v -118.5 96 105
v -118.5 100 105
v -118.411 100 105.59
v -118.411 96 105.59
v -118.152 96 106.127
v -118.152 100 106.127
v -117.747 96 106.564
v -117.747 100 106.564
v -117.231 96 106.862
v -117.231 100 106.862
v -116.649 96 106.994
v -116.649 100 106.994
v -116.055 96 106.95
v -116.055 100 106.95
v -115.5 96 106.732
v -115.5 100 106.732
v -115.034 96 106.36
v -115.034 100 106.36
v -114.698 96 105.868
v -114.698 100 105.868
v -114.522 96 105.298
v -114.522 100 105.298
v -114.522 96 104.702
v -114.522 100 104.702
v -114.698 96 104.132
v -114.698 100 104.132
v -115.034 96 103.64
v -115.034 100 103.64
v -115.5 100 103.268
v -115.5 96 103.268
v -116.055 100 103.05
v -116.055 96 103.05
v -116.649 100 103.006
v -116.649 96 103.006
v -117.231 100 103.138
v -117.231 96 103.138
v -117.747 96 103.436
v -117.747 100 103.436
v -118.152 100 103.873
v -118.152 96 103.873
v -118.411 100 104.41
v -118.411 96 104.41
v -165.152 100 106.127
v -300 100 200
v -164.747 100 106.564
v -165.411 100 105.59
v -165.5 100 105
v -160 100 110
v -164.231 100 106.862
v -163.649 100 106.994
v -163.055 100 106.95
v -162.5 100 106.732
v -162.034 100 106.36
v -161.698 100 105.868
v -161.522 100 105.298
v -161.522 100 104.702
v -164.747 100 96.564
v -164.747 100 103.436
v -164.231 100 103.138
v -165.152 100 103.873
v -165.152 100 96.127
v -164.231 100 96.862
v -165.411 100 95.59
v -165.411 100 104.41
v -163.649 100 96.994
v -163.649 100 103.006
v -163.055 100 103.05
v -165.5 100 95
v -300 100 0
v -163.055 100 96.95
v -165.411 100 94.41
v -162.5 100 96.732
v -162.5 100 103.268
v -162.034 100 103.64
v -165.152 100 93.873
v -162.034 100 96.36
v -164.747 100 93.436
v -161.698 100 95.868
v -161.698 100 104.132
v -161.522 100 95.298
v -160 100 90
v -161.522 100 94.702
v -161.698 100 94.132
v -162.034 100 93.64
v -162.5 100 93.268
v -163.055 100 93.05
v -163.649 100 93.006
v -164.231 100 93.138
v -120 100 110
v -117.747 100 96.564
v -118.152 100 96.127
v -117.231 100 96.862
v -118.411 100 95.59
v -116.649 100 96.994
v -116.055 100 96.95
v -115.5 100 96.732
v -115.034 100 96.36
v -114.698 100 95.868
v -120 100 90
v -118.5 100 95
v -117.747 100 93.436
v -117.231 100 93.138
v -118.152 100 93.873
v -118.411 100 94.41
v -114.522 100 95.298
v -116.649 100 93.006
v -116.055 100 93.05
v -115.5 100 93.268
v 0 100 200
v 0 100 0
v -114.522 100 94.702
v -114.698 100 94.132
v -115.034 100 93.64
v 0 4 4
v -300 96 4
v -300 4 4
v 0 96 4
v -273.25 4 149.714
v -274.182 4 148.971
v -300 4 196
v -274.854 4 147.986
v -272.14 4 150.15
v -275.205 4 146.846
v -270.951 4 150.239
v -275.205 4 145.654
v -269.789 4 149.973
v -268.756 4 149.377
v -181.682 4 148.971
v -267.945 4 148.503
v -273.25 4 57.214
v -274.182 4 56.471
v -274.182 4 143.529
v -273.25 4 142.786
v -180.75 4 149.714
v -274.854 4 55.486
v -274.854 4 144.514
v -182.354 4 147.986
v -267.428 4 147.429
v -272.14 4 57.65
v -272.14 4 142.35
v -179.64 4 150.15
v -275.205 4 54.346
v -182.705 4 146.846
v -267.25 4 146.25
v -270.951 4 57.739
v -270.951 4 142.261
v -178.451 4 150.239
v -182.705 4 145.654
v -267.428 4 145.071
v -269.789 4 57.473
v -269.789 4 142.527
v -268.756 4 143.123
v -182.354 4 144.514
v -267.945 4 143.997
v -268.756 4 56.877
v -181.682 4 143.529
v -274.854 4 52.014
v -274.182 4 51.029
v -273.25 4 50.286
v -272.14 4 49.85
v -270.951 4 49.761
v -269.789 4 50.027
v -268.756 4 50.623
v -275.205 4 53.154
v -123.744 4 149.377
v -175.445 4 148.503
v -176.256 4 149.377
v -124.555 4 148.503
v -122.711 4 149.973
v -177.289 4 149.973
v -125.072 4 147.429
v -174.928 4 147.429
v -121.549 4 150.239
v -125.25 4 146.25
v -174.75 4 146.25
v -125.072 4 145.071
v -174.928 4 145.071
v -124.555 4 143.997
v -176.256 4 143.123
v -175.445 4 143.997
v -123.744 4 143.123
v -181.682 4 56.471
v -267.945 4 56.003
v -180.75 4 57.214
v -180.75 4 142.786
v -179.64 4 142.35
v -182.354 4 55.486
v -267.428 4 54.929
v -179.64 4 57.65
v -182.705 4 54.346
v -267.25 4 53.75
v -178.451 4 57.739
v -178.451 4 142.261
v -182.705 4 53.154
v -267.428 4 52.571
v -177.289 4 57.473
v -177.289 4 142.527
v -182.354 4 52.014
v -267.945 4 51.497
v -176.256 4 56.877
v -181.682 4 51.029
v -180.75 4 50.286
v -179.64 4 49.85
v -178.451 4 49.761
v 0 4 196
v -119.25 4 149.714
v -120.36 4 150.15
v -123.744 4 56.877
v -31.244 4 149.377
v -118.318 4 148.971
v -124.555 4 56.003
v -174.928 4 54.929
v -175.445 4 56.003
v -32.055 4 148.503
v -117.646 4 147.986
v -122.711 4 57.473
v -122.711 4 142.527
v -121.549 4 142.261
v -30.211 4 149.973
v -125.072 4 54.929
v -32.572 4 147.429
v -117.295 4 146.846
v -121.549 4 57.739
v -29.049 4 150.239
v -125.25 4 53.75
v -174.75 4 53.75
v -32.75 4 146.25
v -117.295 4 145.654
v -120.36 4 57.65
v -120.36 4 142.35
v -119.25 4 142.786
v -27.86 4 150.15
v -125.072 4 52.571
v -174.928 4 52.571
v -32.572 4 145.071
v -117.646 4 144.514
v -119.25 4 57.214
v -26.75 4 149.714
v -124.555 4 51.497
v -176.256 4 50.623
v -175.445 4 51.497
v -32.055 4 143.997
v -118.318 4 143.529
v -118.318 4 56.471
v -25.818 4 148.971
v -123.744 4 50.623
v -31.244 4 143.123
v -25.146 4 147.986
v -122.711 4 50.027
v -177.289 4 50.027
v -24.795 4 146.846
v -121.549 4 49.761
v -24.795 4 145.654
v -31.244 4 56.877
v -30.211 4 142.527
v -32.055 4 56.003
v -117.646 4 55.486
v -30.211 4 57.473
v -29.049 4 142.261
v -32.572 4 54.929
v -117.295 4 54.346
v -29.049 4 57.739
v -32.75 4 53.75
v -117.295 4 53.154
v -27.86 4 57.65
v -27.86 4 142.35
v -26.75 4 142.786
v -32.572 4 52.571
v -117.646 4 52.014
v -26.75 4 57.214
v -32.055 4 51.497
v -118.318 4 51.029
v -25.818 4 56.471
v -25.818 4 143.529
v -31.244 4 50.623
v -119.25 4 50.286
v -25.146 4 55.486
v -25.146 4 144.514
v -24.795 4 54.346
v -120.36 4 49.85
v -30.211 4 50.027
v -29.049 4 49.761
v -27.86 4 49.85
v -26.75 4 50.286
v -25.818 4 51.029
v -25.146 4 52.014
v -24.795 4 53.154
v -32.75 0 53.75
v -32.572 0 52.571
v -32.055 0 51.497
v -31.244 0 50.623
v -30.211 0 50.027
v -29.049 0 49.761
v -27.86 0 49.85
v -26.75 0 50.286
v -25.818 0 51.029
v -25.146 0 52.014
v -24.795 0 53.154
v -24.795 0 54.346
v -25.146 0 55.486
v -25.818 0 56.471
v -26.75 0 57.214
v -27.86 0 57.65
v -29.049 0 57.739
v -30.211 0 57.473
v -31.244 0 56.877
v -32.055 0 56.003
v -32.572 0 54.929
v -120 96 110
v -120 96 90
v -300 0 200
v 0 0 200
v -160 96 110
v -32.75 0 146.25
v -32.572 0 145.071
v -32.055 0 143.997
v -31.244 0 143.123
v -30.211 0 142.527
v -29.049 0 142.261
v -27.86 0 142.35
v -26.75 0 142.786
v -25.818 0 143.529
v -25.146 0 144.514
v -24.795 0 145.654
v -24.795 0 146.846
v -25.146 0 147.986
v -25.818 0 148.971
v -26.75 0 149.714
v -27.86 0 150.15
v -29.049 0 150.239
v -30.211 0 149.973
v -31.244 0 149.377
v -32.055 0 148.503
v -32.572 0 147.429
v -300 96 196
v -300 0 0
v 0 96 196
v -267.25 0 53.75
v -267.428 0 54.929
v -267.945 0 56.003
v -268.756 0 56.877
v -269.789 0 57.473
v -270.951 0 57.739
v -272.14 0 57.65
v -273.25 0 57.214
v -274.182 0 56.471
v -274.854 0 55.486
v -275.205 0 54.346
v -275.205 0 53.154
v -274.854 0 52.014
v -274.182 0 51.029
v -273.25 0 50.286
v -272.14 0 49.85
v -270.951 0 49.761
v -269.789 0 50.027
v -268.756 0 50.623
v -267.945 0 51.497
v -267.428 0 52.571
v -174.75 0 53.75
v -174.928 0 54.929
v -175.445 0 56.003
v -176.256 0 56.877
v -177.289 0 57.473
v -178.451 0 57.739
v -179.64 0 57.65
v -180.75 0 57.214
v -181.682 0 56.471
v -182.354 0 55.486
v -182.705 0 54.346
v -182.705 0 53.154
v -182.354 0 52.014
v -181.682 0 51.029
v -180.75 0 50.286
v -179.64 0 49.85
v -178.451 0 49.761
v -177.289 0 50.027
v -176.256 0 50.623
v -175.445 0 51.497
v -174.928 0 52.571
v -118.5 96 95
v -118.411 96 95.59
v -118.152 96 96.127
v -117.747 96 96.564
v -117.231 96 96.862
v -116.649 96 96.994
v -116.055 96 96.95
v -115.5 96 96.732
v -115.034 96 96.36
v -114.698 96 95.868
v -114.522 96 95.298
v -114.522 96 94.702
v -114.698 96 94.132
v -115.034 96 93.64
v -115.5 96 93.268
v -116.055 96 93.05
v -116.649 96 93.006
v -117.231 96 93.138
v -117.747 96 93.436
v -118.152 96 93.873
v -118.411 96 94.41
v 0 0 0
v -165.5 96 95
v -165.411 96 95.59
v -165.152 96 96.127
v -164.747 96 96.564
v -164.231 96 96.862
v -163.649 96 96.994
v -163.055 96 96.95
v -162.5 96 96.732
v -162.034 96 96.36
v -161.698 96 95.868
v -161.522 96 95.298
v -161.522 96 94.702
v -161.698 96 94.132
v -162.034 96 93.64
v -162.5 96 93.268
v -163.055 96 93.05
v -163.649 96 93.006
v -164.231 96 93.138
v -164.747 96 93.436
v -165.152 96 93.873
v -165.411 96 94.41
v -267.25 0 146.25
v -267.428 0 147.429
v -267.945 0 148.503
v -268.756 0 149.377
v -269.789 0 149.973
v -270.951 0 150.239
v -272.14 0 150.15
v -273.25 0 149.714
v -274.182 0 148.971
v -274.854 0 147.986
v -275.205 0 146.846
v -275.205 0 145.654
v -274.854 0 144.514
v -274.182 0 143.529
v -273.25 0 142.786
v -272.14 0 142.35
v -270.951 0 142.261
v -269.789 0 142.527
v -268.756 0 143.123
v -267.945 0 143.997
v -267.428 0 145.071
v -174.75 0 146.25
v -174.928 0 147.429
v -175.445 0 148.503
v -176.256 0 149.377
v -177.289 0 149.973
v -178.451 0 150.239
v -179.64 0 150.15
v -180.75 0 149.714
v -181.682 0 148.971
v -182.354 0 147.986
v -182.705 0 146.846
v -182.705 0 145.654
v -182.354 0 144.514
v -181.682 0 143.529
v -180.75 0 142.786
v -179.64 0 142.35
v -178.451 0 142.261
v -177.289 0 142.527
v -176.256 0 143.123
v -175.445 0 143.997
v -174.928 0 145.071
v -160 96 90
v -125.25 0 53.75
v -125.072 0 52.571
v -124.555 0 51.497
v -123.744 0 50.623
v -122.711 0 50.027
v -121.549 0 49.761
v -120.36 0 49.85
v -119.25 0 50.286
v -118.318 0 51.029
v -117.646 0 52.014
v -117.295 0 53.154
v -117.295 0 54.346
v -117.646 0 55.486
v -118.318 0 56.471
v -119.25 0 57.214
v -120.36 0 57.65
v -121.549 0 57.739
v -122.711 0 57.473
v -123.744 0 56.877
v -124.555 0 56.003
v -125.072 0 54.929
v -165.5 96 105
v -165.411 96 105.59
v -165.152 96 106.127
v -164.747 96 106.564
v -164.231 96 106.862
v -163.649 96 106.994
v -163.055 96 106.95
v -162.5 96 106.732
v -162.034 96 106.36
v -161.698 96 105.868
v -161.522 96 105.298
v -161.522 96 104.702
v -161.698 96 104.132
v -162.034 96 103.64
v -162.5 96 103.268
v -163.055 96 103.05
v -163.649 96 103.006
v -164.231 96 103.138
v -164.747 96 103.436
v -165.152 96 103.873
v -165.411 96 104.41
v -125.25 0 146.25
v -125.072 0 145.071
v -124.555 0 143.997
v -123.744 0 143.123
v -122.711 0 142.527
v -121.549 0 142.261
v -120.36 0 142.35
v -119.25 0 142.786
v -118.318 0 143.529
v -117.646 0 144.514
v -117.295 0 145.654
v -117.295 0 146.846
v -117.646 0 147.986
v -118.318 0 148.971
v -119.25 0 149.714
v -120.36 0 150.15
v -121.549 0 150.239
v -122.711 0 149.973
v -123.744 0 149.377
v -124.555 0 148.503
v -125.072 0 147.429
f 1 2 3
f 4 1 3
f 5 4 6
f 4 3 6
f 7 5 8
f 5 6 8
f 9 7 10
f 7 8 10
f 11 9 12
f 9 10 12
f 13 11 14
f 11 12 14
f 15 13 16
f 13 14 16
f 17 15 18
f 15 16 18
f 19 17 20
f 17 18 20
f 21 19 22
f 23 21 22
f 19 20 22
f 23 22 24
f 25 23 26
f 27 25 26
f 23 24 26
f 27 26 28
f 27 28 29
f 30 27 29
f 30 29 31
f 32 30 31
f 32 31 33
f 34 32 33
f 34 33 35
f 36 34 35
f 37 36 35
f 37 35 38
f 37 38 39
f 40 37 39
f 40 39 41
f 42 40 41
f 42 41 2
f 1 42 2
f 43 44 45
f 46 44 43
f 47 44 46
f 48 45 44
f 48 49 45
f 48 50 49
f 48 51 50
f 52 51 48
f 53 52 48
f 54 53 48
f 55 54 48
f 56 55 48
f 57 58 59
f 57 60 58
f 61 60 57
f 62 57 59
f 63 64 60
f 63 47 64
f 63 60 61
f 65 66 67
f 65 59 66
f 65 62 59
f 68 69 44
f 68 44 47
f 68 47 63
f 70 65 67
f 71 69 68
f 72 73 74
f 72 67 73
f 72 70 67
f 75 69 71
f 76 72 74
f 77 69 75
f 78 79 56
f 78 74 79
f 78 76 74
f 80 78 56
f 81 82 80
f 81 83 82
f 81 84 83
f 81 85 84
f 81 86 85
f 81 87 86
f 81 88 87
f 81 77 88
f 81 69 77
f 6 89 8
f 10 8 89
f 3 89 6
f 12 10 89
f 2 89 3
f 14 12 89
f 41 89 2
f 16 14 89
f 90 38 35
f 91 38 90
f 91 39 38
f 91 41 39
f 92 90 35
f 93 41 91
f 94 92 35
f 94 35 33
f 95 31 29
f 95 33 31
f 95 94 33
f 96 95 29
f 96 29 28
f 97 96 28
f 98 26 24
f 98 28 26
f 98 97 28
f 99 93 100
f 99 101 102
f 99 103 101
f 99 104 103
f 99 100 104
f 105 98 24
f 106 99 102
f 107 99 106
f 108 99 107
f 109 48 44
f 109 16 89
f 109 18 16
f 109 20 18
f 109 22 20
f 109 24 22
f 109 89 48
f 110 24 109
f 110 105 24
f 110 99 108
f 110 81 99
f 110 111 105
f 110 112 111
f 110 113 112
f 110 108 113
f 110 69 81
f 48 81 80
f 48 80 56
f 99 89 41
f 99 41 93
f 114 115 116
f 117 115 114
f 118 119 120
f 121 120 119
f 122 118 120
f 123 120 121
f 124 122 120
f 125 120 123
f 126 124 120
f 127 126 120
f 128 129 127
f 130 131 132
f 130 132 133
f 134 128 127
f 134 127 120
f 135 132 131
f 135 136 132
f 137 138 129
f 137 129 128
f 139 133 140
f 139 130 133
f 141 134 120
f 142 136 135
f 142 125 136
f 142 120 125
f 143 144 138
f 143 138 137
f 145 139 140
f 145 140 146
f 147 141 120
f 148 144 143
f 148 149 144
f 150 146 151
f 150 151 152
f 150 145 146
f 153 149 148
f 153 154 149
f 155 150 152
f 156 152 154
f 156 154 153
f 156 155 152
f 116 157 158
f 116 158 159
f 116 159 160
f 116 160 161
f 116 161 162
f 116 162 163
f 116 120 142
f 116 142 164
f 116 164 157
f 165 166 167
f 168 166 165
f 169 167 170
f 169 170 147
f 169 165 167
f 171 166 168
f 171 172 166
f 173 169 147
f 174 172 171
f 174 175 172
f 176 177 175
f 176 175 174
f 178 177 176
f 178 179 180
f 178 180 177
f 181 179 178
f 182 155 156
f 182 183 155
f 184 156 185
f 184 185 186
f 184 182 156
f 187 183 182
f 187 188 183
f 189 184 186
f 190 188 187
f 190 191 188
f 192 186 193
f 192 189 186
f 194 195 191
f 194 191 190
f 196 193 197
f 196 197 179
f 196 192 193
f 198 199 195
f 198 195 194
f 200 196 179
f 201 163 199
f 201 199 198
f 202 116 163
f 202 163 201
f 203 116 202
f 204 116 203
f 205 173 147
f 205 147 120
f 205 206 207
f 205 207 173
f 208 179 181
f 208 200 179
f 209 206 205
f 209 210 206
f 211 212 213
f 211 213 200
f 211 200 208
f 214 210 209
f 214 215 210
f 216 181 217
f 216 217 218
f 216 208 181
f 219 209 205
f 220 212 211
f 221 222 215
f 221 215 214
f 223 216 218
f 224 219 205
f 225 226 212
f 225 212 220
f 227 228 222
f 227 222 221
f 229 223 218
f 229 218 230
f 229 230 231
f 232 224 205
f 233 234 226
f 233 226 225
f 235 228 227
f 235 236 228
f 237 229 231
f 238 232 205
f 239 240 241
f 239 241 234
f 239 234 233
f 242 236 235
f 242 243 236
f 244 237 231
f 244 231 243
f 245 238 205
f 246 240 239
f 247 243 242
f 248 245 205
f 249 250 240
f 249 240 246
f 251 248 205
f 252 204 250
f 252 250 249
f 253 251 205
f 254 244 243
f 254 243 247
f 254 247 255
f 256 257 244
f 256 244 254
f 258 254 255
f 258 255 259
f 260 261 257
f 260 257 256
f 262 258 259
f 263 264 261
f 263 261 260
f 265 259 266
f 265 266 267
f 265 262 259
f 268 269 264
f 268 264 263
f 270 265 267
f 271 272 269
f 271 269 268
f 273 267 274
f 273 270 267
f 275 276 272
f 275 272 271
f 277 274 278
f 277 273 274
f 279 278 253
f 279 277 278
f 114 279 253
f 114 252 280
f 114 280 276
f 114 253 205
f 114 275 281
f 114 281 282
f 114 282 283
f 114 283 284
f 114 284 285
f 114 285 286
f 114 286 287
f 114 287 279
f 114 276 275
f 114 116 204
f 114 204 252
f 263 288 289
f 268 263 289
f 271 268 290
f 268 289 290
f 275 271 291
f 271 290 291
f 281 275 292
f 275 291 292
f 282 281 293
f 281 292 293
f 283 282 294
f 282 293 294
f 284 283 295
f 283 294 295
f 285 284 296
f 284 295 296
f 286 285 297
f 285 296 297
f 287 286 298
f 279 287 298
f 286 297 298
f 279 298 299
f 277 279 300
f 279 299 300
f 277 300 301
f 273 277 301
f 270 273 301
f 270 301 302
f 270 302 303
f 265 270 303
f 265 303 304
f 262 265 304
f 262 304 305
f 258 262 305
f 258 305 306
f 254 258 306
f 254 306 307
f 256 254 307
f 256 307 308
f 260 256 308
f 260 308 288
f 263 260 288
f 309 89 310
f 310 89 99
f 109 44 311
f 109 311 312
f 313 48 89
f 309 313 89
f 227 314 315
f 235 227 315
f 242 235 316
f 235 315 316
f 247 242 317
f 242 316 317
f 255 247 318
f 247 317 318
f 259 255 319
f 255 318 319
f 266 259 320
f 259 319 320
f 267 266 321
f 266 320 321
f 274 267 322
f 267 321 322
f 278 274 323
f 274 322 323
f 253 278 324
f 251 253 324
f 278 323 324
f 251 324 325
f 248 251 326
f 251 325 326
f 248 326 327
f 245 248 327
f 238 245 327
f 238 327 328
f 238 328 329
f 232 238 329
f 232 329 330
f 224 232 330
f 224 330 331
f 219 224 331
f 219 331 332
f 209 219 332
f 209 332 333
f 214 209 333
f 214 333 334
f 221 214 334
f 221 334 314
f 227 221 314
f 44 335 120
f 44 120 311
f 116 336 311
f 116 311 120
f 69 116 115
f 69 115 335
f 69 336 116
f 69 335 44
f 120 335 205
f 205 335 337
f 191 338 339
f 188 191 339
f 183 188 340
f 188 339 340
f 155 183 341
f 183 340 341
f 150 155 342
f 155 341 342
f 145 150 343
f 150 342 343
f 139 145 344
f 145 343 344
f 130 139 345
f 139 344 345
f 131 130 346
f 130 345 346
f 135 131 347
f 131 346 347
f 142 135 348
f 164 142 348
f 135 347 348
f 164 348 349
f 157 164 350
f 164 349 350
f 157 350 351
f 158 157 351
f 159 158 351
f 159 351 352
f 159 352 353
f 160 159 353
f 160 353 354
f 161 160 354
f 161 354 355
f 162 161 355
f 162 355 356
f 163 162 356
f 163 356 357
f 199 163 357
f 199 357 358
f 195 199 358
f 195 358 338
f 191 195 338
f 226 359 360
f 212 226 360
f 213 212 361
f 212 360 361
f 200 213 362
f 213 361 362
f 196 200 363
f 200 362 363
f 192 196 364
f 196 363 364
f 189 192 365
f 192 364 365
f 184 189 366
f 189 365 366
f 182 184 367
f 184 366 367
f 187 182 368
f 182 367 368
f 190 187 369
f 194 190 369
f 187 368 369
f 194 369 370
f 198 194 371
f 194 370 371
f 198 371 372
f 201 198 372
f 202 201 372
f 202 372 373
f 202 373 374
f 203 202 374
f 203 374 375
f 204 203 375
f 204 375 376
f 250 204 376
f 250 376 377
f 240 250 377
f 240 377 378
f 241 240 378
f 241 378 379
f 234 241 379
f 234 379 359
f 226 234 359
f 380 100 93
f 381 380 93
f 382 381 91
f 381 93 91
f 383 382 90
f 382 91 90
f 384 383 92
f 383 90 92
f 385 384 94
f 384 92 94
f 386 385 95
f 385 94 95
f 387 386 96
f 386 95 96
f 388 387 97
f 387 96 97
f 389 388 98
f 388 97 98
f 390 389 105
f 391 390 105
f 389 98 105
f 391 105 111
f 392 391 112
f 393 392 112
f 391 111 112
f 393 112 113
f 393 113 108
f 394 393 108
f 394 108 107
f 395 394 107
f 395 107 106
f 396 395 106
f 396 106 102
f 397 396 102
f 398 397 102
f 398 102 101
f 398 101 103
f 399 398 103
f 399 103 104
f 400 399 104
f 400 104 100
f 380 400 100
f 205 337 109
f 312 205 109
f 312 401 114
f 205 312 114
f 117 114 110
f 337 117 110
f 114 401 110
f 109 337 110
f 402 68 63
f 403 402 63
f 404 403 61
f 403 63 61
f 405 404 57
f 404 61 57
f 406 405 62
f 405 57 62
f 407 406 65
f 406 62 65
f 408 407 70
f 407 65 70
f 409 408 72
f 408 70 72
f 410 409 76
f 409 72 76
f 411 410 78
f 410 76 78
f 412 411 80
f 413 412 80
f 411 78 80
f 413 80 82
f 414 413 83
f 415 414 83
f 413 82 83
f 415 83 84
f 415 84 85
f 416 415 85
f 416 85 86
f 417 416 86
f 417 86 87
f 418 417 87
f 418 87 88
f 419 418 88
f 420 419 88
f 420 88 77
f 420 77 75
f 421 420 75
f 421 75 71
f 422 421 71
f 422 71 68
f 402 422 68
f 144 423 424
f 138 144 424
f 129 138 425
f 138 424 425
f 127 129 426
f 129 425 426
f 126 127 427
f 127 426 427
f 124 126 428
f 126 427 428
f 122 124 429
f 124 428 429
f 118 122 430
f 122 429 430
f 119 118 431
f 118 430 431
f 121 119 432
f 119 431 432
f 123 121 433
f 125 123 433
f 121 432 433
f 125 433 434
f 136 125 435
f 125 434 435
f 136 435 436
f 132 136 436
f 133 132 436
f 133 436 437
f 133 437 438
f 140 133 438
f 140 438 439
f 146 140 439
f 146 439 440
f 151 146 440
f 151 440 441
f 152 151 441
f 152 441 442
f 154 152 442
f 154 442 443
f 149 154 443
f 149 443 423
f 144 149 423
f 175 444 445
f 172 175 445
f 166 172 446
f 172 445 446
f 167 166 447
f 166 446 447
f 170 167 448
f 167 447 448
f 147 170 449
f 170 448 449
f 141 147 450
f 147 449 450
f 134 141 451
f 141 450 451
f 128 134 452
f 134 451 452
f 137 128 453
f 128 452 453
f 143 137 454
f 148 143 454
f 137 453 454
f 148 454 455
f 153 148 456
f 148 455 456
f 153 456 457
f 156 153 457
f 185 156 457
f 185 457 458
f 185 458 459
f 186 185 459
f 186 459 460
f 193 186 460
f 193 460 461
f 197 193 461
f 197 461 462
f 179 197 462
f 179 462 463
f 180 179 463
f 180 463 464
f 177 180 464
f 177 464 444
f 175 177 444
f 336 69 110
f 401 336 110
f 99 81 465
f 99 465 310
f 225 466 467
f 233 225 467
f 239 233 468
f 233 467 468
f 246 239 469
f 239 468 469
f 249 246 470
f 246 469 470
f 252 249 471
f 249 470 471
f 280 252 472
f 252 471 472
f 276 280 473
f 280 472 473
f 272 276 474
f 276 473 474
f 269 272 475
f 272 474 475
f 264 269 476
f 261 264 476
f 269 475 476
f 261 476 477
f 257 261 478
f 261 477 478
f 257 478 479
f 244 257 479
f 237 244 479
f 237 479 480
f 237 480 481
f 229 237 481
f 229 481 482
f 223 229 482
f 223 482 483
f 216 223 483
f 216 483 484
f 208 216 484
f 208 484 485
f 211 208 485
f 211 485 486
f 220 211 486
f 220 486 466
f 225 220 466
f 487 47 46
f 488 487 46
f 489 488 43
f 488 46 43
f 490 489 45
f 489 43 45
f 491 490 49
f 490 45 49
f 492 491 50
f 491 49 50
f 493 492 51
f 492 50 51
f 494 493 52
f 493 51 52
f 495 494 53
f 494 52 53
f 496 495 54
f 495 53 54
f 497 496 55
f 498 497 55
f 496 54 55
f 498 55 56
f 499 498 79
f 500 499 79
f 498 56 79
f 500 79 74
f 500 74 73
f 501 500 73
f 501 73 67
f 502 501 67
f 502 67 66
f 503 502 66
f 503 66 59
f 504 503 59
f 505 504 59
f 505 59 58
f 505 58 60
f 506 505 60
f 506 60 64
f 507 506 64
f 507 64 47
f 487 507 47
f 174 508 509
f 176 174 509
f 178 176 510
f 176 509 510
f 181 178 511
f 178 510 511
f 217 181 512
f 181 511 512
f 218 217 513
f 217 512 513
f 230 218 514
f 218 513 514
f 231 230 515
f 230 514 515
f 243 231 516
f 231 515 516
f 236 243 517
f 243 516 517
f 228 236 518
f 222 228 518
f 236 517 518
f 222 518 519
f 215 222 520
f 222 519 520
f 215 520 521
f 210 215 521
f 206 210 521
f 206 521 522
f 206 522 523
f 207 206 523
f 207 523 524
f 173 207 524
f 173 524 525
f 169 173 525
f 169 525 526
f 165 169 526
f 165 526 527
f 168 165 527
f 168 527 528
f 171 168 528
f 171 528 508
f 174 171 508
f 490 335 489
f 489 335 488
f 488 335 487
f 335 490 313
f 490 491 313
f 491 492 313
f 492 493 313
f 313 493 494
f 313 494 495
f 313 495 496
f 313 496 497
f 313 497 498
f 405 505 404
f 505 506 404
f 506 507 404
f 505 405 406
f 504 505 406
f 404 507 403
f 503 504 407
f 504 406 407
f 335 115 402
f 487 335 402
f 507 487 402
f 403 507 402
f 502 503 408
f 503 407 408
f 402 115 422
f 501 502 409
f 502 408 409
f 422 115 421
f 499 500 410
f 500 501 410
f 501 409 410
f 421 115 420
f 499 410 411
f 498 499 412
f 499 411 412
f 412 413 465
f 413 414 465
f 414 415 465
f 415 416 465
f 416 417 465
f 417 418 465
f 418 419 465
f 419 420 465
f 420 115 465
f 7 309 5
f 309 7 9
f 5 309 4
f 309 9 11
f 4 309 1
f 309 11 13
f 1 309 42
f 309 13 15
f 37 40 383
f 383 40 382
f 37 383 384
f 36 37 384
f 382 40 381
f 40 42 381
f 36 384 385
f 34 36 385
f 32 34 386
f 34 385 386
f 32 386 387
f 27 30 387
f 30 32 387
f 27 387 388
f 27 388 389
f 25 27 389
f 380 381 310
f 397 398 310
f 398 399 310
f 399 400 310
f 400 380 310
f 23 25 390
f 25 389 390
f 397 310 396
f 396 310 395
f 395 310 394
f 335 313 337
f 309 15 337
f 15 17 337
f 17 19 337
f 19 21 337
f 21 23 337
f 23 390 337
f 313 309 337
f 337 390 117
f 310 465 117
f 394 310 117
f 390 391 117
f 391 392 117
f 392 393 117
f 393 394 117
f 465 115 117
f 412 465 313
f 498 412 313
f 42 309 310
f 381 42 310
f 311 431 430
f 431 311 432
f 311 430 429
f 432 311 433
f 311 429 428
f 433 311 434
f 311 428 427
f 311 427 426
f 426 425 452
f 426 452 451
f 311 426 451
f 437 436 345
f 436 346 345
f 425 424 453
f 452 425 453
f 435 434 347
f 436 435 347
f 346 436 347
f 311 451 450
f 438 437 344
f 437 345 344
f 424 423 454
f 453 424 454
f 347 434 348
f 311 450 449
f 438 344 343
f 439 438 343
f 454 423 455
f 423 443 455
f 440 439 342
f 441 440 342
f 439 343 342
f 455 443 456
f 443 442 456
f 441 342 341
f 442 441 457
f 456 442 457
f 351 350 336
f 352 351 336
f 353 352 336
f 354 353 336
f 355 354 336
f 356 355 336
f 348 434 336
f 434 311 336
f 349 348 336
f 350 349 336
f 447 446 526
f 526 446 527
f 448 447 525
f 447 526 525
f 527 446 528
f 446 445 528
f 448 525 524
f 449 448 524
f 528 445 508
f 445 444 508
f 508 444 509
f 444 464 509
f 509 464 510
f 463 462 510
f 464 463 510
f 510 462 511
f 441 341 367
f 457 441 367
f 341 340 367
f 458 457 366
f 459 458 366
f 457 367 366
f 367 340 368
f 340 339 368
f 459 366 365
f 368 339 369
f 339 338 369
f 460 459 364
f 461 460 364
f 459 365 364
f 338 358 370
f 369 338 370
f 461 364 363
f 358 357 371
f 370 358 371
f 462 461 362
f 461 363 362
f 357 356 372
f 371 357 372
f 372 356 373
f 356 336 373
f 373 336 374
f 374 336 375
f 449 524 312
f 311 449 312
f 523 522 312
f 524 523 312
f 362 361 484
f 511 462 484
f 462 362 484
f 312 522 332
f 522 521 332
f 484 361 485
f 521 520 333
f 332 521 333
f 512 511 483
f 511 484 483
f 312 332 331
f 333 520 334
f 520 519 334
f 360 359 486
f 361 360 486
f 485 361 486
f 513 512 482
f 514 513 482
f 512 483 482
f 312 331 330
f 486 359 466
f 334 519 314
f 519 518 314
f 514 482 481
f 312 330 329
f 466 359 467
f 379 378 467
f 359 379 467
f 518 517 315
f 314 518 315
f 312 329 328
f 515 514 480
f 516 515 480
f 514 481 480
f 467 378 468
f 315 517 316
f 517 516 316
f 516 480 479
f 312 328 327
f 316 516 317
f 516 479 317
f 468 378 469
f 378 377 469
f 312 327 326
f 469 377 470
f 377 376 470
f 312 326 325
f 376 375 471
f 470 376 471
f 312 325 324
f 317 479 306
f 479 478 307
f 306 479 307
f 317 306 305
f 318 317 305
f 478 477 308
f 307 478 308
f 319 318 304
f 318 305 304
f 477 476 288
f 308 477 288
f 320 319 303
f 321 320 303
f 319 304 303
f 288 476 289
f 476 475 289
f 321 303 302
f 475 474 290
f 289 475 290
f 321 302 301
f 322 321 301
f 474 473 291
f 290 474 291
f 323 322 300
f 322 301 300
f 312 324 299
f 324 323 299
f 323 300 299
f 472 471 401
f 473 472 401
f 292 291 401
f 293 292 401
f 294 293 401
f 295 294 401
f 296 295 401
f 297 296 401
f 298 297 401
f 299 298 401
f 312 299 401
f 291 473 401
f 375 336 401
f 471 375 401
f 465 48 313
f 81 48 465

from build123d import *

# Parameters (mm, degrees)
IZIM1_W                     = 300
IZIM1_H                     = 100
Y_KSEKLIK_EKSTR_ZYON1_DEPTH = 200
BO_ALTMA1_T                 = -4
KES_EKSTR_ZYON1_REACH       = 376.166
IZIM2_R                     = 4
KES_EKSTR_ZYON2_REACH       = 376.166
IZIM3_R                     = 2
IZIM3_W                     = 40
IZIM3_H                     = 20


with BuildPart() as part:
    # Çizim1 → Yükseklik-Ekstrüzyon1 (new body)
    with BuildSketch(Plane.XY):
        with Locations((-150, 50)):
            Rectangle(IZIM1_W, IZIM1_H)
    extrude(amount=Y_KSEKLIK_EKSTR_ZYON1_DEPTH)

    # İç Boşaltma1
    bo_altma1_openings = [part.faces().sort_by_distance(p)[0] for p in [
        (-300, 50, 100),
        (0, 50, 100),
    ]]
    offset(amount=BO_ALTMA1_T, openings=bo_altma1_openings, kind=Kind.INTERSECTION)

    # Çizim2 → Kes-Ekstrüzyon1 (cut, up to next)
    with BuildSketch(Plane.XZ, mode=Mode.PRIVATE) as kes_ekstr_zyon1_sk1:
        with Locations((-271.25, 146.25)):
            Circle(IZIM2_R)
    kes_ekstr_zyon1_tool1 = extrude(kes_ekstr_zyon1_sk1.sketch, amount=-KES_EKSTR_ZYON1_REACH, mode=Mode.PRIVATE) & part.part
    # Çizim2 → Kes-Ekstrüzyon1 (cut, up to next)
    with BuildSketch(Plane.XZ, mode=Mode.PRIVATE) as kes_ekstr_zyon1_sk2:
        with Locations((-178.75, 146.25)):
            Circle(IZIM2_R)
    kes_ekstr_zyon1_tool2 = extrude(kes_ekstr_zyon1_sk2.sketch, amount=-KES_EKSTR_ZYON1_REACH, mode=Mode.PRIVATE) & part.part
    # Çizim2 → Kes-Ekstrüzyon1 (cut, up to next)
    with BuildSketch(Plane.XZ, mode=Mode.PRIVATE) as kes_ekstr_zyon1_sk3:
        with Locations(Location((-28.75, 146.25, 0), (0, 0, 180))):
            Circle(IZIM2_R)
    kes_ekstr_zyon1_tool3 = extrude(kes_ekstr_zyon1_sk3.sketch, amount=-KES_EKSTR_ZYON1_REACH, mode=Mode.PRIVATE) & part.part
    # Çizim2 → Kes-Ekstrüzyon1 (cut, up to next)
    with BuildSketch(Plane.XZ, mode=Mode.PRIVATE) as kes_ekstr_zyon1_sk4:
        with Locations(Location((-121.25, 146.25, 0), (0, 0, 180))):
            Circle(IZIM2_R)
    kes_ekstr_zyon1_tool4 = extrude(kes_ekstr_zyon1_sk4.sketch, amount=-KES_EKSTR_ZYON1_REACH, mode=Mode.PRIVATE) & part.part
    # Çizim2 → Kes-Ekstrüzyon1 (cut, up to next)
    with BuildSketch(Plane.XZ, mode=Mode.PRIVATE) as kes_ekstr_zyon1_sk5:
        with Locations((-271.25, 53.75)):
            Circle(IZIM2_R)
    kes_ekstr_zyon1_tool5 = extrude(kes_ekstr_zyon1_sk5.sketch, amount=-KES_EKSTR_ZYON1_REACH, mode=Mode.PRIVATE) & part.part
    # Çizim2 → Kes-Ekstrüzyon1 (cut, up to next)
    with BuildSketch(Plane.XZ, mode=Mode.PRIVATE) as kes_ekstr_zyon1_sk6:
        with Locations((-178.75, 53.75)):
            Circle(IZIM2_R)
    kes_ekstr_zyon1_tool6 = extrude(kes_ekstr_zyon1_sk6.sketch, amount=-KES_EKSTR_ZYON1_REACH, mode=Mode.PRIVATE) & part.part
    # Çizim2 → Kes-Ekstrüzyon1 (cut, up to next)
    with BuildSketch(Plane.XZ, mode=Mode.PRIVATE) as kes_ekstr_zyon1_sk7:
        with Locations(Location((-121.25, 53.75, 0), (0, 0, 180))):
            Circle(IZIM2_R)
    kes_ekstr_zyon1_tool7 = extrude(kes_ekstr_zyon1_sk7.sketch, amount=-KES_EKSTR_ZYON1_REACH, mode=Mode.PRIVATE) & part.part
    # Çizim2 → Kes-Ekstrüzyon1 (cut, up to next)
    with BuildSketch(Plane.XZ, mode=Mode.PRIVATE) as kes_ekstr_zyon1_sk8:
        with Locations(Location((-28.75, 53.75, 0), (0, 0, 180))):
            Circle(IZIM2_R)
    kes_ekstr_zyon1_tool8 = extrude(kes_ekstr_zyon1_sk8.sketch, amount=-KES_EKSTR_ZYON1_REACH, mode=Mode.PRIVATE) & part.part
    add(kes_ekstr_zyon1_tool1.solids().sort_by_distance((-271.25, 0, 146.25))[0], mode=Mode.SUBTRACT)
    add(kes_ekstr_zyon1_tool2.solids().sort_by_distance((-178.75, 0, 146.25))[0], mode=Mode.SUBTRACT)
    add(kes_ekstr_zyon1_tool3.solids().sort_by_distance((-28.75, 0, 146.25))[0], mode=Mode.SUBTRACT)
    add(kes_ekstr_zyon1_tool4.solids().sort_by_distance((-121.25, 0, 146.25))[0], mode=Mode.SUBTRACT)
    add(kes_ekstr_zyon1_tool5.solids().sort_by_distance((-271.25, 0, 53.75))[0], mode=Mode.SUBTRACT)
    add(kes_ekstr_zyon1_tool6.solids().sort_by_distance((-178.75, 0, 53.75))[0], mode=Mode.SUBTRACT)
    add(kes_ekstr_zyon1_tool7.solids().sort_by_distance((-121.25, 0, 53.75))[0], mode=Mode.SUBTRACT)
    add(kes_ekstr_zyon1_tool8.solids().sort_by_distance((-28.75, 0, 53.75))[0], mode=Mode.SUBTRACT)

    # Çizim3 → Kes-Ekstrüzyon2 (cut, up to next)
    with BuildSketch(Plane(origin=(0, 100, 0), x_dir=(1, 0, 0), z_dir=(0, 1, 0)), mode=Mode.PRIVATE) as kes_ekstr_zyon2_sk1:
        with Locations(Location((-116.5, -95, 0), (0, 0, 180))):
            Circle(IZIM3_R)
    kes_ekstr_zyon2_tool1 = extrude(kes_ekstr_zyon2_sk1.sketch, amount=-KES_EKSTR_ZYON2_REACH, mode=Mode.PRIVATE) & part.part
    # Çizim3 → Kes-Ekstrüzyon2 (cut, up to next)
    with BuildSketch(Plane(origin=(0, 100, 0), x_dir=(1, 0, 0), z_dir=(0, 1, 0)), mode=Mode.PRIVATE) as kes_ekstr_zyon2_sk2:
        with Locations(Location((-116.5, -105, 0), (0, 0, 180))):
            Circle(IZIM3_R)
    kes_ekstr_zyon2_tool2 = extrude(kes_ekstr_zyon2_sk2.sketch, amount=-KES_EKSTR_ZYON2_REACH, mode=Mode.PRIVATE) & part.part
    # Çizim3 → Kes-Ekstrüzyon2 (cut, up to next)
    with BuildSketch(Plane(origin=(0, 100, 0), x_dir=(1, 0, 0), z_dir=(0, 1, 0)), mode=Mode.PRIVATE) as kes_ekstr_zyon2_sk3:
        with Locations(Location((-163.5, -105, 0), (0, 0, 180))):
            Circle(IZIM3_R)
    kes_ekstr_zyon2_tool3 = extrude(kes_ekstr_zyon2_sk3.sketch, amount=-KES_EKSTR_ZYON2_REACH, mode=Mode.PRIVATE) & part.part
    # Çizim3 → Kes-Ekstrüzyon2 (cut, up to next)
    with BuildSketch(Plane(origin=(0, 100, 0), x_dir=(1, 0, 0), z_dir=(0, 1, 0)), mode=Mode.PRIVATE) as kes_ekstr_zyon2_sk4:
        with Locations(Location((-163.5, -95, 0), (0, 0, 180))):
            Circle(IZIM3_R)
    kes_ekstr_zyon2_tool4 = extrude(kes_ekstr_zyon2_sk4.sketch, amount=-KES_EKSTR_ZYON2_REACH, mode=Mode.PRIVATE) & part.part
    # Çizim3 → Kes-Ekstrüzyon2 (cut, up to next)
    with BuildSketch(Plane(origin=(0, 100, 0), x_dir=(1, 0, 0), z_dir=(0, 1, 0)), mode=Mode.PRIVATE) as kes_ekstr_zyon2_sk5:
        with Locations((-140, -100)):
            Rectangle(IZIM3_W, IZIM3_H)
    kes_ekstr_zyon2_tool5 = extrude(kes_ekstr_zyon2_sk5.sketch, amount=-KES_EKSTR_ZYON2_REACH, mode=Mode.PRIVATE) & part.part
    add(kes_ekstr_zyon2_tool1.solids().sort_by_distance((-116.5, 100, 95))[0], mode=Mode.SUBTRACT)
    add(kes_ekstr_zyon2_tool2.solids().sort_by_distance((-116.5, 100, 105))[0], mode=Mode.SUBTRACT)
    add(kes_ekstr_zyon2_tool3.solids().sort_by_distance((-163.5, 100, 105))[0], mode=Mode.SUBTRACT)
    add(kes_ekstr_zyon2_tool4.solids().sort_by_distance((-163.5, 100, 95))[0], mode=Mode.SUBTRACT)
    add(kes_ekstr_zyon2_tool5.solids().sort_by_distance((-140, 100, 100))[0], mode=Mode.SUBTRACT)


solid = part.part
